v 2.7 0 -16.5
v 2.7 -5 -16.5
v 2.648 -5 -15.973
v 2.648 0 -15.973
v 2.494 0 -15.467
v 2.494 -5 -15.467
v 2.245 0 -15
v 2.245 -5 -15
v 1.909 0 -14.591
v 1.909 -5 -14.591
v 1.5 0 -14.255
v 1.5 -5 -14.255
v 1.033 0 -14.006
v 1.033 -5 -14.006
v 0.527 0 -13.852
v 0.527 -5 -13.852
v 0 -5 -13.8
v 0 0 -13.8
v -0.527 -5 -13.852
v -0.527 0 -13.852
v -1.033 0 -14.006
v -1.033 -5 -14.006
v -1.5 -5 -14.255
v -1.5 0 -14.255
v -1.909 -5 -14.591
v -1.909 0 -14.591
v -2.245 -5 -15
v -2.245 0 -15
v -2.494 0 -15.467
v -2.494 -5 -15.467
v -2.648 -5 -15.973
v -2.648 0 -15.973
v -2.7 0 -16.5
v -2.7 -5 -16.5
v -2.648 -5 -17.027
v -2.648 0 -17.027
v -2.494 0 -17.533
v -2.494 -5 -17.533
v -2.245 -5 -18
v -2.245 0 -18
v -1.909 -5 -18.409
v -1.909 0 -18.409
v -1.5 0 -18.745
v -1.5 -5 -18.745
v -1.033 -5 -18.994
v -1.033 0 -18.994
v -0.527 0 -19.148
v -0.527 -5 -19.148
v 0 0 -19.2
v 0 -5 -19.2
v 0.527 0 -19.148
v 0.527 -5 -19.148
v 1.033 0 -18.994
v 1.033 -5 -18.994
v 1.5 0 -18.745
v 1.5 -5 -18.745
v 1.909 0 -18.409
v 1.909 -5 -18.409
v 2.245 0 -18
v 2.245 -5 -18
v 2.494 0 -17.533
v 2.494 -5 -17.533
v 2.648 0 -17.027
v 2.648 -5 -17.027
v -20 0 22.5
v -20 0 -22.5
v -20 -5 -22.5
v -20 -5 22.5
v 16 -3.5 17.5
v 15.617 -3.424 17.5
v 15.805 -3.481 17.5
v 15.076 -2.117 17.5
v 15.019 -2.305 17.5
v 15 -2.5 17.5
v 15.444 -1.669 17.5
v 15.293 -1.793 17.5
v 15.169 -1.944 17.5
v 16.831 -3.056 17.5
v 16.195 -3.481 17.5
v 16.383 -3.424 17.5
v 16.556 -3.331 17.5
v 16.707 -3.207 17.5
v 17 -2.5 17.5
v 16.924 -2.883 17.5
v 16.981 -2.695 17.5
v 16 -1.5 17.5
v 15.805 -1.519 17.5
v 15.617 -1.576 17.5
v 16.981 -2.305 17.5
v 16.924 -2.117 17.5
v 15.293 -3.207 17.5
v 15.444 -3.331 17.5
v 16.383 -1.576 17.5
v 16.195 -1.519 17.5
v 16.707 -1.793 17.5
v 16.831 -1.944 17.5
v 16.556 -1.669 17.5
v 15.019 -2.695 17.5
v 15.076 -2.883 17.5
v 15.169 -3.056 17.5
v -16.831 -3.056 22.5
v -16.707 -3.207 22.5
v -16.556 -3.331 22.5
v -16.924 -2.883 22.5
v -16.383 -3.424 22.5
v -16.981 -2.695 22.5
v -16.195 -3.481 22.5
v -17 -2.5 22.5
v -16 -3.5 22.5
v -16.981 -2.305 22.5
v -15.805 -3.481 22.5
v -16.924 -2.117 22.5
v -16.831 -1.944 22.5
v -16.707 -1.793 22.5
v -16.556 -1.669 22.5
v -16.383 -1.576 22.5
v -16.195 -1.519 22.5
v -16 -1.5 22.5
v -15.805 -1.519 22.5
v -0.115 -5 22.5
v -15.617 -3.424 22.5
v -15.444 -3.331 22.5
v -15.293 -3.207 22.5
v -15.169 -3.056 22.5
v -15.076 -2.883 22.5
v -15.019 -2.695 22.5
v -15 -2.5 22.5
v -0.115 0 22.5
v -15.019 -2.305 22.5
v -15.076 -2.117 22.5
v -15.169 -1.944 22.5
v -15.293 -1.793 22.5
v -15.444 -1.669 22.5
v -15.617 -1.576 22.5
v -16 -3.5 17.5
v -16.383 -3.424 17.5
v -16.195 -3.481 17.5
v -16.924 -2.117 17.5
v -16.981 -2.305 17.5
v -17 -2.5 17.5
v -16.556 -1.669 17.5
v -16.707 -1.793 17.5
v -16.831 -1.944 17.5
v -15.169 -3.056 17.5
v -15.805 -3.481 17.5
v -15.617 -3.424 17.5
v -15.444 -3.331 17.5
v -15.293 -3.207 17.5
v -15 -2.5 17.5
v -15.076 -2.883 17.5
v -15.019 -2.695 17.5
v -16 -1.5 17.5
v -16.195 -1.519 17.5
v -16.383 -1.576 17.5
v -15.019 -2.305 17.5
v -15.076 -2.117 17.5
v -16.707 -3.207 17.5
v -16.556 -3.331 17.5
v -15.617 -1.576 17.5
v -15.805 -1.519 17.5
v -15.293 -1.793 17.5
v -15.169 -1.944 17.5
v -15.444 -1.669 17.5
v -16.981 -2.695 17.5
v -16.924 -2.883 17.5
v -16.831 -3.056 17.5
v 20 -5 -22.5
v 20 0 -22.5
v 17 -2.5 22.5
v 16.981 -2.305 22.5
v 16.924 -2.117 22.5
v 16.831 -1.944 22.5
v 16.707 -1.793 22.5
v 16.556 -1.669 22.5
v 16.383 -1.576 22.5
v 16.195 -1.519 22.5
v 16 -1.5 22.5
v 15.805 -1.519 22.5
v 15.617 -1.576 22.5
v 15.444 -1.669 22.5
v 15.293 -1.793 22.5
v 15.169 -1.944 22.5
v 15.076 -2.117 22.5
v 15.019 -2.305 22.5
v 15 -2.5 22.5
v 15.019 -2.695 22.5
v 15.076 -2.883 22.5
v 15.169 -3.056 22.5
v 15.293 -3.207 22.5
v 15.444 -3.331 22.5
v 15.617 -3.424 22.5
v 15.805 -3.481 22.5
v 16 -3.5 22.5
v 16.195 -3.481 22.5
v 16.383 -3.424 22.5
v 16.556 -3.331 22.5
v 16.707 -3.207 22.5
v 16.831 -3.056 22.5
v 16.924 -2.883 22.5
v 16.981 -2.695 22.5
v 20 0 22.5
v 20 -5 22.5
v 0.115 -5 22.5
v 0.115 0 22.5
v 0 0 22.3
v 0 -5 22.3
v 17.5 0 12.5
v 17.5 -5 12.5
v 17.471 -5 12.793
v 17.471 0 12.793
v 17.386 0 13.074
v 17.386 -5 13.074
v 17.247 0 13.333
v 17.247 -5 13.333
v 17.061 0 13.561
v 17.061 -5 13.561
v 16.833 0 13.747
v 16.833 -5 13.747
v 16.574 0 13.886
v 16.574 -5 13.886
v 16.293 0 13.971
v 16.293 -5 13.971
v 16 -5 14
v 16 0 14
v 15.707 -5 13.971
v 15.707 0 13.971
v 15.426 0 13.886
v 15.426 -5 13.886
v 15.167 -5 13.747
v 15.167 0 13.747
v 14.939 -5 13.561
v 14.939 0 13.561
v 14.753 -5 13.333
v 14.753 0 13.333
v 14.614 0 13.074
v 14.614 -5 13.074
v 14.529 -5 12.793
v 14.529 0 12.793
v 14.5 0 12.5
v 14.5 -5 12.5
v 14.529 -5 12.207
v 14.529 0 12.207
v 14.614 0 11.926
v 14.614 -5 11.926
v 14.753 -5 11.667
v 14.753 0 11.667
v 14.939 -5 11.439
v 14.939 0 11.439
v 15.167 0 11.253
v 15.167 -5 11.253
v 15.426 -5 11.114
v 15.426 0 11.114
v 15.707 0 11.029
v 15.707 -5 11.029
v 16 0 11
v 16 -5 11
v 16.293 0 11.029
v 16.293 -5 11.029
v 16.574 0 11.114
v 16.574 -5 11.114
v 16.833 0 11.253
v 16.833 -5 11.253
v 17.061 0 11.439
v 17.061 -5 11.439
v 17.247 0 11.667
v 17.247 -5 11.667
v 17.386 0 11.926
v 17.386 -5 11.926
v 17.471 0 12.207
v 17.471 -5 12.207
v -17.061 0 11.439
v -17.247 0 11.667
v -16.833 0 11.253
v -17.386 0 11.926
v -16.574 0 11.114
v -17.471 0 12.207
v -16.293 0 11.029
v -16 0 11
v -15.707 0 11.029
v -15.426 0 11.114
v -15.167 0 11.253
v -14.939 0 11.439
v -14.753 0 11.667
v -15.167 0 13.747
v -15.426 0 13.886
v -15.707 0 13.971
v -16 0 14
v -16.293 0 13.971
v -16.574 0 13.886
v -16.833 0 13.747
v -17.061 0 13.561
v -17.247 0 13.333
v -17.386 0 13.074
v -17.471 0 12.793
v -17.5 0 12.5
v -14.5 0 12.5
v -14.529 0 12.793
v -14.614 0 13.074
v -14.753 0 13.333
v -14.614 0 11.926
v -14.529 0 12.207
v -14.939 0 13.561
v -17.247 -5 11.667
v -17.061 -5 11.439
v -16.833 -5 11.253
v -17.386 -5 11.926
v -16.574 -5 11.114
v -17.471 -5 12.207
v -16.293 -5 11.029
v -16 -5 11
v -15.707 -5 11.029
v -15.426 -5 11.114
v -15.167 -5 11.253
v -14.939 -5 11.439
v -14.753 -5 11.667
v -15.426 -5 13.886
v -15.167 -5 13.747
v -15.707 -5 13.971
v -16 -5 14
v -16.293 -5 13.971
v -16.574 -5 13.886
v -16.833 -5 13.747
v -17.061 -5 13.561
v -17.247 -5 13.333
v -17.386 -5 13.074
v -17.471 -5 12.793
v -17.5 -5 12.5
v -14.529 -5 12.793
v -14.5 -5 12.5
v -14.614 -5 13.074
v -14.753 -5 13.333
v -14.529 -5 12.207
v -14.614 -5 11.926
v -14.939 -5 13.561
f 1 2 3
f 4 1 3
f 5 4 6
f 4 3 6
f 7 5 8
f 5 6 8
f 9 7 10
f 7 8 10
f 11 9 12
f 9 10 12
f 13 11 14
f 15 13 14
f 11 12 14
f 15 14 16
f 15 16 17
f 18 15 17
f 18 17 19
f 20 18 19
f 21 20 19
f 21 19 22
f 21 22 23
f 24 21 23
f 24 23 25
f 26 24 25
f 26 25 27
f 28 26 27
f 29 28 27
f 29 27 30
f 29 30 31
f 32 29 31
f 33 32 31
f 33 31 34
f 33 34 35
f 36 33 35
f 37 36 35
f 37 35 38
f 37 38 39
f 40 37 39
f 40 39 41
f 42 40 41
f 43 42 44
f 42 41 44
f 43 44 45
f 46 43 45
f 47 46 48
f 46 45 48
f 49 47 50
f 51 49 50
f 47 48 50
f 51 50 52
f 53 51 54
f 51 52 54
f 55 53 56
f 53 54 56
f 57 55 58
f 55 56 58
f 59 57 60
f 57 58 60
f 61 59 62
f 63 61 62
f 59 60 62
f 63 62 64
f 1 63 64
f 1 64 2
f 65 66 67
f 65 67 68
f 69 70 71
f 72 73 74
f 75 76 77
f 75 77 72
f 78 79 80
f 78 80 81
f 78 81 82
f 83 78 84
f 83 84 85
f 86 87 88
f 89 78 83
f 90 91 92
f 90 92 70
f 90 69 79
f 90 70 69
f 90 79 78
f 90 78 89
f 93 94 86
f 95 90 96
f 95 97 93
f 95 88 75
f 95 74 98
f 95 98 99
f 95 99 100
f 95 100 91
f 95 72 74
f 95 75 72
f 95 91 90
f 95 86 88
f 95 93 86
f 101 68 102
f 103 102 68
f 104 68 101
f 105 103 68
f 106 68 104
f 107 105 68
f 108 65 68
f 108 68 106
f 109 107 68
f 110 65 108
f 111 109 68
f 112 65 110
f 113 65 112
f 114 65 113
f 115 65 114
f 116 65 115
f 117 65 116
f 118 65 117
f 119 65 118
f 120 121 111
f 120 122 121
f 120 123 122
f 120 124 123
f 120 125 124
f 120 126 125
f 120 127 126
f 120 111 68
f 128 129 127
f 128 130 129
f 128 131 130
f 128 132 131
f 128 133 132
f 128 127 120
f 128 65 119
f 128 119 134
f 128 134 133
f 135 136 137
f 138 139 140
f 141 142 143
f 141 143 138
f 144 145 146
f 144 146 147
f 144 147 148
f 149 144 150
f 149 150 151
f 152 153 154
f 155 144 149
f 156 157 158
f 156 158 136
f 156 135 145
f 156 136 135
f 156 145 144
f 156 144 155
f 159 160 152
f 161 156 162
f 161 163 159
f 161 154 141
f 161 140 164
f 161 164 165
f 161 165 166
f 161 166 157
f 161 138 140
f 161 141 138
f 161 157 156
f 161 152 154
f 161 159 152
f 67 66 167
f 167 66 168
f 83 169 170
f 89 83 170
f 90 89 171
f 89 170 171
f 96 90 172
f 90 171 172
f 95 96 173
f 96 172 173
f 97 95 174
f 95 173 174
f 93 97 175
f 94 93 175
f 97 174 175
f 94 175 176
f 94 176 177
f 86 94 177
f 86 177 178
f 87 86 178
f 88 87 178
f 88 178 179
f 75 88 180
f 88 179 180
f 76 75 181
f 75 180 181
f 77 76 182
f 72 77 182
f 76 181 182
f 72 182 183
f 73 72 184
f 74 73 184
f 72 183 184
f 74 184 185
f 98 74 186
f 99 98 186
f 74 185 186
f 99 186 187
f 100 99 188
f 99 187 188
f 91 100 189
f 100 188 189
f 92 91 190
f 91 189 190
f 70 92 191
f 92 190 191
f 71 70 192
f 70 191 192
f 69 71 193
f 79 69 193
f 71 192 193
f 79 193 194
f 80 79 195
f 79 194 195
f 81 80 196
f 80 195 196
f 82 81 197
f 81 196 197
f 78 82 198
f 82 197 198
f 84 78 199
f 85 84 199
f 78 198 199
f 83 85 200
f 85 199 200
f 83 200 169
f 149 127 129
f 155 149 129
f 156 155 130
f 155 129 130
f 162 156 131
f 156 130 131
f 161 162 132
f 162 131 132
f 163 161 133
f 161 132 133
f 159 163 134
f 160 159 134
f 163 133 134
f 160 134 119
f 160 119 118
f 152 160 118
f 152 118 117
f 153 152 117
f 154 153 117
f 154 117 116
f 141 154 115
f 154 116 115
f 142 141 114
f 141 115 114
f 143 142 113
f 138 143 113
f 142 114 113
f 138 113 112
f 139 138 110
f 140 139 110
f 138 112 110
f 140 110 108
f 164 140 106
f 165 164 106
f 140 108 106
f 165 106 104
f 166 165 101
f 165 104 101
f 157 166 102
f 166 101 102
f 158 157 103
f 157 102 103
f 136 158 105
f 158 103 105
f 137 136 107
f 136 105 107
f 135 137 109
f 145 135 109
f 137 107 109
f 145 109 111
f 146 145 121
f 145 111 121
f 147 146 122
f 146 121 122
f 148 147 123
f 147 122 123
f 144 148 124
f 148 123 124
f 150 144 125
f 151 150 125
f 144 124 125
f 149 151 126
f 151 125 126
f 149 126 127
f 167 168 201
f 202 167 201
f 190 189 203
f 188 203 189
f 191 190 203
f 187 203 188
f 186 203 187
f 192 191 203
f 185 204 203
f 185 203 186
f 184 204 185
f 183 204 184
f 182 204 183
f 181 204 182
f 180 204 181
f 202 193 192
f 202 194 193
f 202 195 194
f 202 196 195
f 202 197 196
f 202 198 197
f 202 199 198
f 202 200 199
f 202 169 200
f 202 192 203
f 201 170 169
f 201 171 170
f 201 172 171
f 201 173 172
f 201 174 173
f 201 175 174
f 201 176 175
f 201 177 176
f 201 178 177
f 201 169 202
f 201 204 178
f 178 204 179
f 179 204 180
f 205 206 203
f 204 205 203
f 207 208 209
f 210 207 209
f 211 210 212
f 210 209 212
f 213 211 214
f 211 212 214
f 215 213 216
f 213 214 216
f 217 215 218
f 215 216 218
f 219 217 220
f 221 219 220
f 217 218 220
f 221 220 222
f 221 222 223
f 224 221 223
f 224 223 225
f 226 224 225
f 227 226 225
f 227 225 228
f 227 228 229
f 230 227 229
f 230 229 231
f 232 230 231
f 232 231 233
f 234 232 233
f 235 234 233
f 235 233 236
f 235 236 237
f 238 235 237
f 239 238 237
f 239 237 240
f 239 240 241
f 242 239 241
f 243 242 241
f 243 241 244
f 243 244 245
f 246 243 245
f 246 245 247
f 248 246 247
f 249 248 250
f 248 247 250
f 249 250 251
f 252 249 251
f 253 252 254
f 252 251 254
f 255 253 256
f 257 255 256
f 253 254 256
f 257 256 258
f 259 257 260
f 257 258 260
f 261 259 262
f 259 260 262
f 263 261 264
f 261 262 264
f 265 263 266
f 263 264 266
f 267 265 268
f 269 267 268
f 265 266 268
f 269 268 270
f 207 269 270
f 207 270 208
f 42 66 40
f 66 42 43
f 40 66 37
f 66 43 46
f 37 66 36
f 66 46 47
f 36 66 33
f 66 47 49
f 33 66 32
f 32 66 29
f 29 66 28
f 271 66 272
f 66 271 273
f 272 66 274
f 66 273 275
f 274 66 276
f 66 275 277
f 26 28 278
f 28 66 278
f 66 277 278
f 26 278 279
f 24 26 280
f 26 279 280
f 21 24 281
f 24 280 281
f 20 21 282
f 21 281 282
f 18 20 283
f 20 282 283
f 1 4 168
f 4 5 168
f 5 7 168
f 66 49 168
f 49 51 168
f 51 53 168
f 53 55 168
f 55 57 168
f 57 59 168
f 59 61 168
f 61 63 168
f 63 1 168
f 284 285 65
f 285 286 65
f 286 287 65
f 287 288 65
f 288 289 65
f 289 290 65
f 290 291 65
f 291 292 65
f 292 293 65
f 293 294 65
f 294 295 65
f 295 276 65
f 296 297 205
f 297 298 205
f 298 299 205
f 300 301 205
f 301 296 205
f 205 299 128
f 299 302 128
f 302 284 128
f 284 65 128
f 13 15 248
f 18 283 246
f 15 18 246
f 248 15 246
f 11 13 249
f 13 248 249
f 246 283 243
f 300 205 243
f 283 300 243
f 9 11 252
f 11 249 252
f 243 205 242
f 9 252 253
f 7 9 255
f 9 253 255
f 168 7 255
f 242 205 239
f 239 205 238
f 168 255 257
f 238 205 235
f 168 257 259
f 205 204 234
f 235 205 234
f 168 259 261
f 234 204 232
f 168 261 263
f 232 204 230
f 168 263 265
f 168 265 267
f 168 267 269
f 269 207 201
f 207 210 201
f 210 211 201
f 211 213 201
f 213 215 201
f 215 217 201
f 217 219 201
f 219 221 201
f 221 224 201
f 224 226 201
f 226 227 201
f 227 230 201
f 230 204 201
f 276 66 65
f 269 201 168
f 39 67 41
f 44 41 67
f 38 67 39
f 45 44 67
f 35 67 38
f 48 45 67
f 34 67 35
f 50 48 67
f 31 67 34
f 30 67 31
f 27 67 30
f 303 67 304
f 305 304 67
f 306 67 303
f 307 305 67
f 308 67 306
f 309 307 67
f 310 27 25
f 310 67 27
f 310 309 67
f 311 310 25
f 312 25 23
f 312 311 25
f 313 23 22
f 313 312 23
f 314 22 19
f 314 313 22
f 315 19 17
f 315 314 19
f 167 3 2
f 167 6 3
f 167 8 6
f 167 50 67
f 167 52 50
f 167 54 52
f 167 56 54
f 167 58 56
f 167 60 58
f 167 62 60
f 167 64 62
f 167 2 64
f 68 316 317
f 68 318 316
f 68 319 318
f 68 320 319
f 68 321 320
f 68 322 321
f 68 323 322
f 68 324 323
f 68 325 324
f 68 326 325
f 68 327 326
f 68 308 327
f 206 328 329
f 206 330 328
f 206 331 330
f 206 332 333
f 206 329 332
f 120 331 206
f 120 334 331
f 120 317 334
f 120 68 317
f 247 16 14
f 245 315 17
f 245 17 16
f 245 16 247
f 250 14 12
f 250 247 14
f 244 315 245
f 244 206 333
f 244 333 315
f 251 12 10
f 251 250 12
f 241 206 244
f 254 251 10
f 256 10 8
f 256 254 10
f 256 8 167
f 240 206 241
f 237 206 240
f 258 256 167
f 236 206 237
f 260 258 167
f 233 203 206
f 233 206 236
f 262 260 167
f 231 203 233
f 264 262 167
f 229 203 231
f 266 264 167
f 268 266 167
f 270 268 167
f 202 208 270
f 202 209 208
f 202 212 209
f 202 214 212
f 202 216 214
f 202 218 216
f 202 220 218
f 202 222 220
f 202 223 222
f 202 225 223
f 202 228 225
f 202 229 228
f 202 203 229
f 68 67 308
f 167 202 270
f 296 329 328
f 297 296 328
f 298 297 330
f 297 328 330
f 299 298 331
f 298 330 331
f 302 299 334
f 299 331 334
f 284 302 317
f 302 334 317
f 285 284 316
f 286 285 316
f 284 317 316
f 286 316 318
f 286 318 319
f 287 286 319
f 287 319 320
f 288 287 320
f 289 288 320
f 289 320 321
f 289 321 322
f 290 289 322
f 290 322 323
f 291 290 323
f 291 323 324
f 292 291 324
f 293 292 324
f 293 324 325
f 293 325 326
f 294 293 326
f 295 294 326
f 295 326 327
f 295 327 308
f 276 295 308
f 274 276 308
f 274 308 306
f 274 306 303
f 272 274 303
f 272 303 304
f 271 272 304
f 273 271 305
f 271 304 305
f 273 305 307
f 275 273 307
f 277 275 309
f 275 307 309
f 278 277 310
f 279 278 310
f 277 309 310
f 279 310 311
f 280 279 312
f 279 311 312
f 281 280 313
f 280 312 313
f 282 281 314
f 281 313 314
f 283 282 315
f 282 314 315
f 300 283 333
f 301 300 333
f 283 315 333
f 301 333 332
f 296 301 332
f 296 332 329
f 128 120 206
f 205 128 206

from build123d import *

# Parameters (mm, degrees)
F0_W      = 40
F0_H      = 45
F1_DEPTH  = 5
F2_R      = 1.5
F3_DEPTH  = 25
F6_DEPTH  = 25
F7_R      = 1
F8_DEPTH  = 5
F9_R      = 2.7
F10_DEPTH = 25


with BuildPart() as f1:
    # F0 (on Front) → F1 (new body)
    with BuildSketch(Plane.XZ):
        Rectangle(F0_W, F0_H)
    extrude(amount=F1_DEPTH)

    # F2 (on face) → F3 (cut)
    with BuildSketch(Plane.XZ.offset(5)):
        with Locations((16, 12.5)):
            Circle(F2_R)
        with Locations((-16, 12.5)):
            Circle(F2_R)
    extrude(amount=-F3_DEPTH, mode=Mode.SUBTRACT)

    # F5 (on face) → F6 (cut)
    with BuildSketch(Plane.XZ.offset(5)):
        Polygon((0.173205, 22.6), (-0.173205, 22.6), (0, 22.3), align=None)
    extrude(amount=-F6_DEPTH, mode=Mode.SUBTRACT)

    # F7 (on face) → F8 (cut)
    with BuildSketch(Plane.XY.offset(22.5)):
        with Locations((16, -2.5)):
            Circle(F7_R)
        with Locations((-16, -2.5)):
            Circle(F7_R)
    extrude(amount=-F8_DEPTH, mode=Mode.SUBTRACT)

    # F9 (on face) → F10 (cut)
    with BuildSketch(Plane.XZ.offset(5)):
        with Locations((0, -16.5)):
            Circle(F9_R)
    extrude(amount=-F10_DEPTH, mode=Mode.SUBTRACT)


solid = f1.part
